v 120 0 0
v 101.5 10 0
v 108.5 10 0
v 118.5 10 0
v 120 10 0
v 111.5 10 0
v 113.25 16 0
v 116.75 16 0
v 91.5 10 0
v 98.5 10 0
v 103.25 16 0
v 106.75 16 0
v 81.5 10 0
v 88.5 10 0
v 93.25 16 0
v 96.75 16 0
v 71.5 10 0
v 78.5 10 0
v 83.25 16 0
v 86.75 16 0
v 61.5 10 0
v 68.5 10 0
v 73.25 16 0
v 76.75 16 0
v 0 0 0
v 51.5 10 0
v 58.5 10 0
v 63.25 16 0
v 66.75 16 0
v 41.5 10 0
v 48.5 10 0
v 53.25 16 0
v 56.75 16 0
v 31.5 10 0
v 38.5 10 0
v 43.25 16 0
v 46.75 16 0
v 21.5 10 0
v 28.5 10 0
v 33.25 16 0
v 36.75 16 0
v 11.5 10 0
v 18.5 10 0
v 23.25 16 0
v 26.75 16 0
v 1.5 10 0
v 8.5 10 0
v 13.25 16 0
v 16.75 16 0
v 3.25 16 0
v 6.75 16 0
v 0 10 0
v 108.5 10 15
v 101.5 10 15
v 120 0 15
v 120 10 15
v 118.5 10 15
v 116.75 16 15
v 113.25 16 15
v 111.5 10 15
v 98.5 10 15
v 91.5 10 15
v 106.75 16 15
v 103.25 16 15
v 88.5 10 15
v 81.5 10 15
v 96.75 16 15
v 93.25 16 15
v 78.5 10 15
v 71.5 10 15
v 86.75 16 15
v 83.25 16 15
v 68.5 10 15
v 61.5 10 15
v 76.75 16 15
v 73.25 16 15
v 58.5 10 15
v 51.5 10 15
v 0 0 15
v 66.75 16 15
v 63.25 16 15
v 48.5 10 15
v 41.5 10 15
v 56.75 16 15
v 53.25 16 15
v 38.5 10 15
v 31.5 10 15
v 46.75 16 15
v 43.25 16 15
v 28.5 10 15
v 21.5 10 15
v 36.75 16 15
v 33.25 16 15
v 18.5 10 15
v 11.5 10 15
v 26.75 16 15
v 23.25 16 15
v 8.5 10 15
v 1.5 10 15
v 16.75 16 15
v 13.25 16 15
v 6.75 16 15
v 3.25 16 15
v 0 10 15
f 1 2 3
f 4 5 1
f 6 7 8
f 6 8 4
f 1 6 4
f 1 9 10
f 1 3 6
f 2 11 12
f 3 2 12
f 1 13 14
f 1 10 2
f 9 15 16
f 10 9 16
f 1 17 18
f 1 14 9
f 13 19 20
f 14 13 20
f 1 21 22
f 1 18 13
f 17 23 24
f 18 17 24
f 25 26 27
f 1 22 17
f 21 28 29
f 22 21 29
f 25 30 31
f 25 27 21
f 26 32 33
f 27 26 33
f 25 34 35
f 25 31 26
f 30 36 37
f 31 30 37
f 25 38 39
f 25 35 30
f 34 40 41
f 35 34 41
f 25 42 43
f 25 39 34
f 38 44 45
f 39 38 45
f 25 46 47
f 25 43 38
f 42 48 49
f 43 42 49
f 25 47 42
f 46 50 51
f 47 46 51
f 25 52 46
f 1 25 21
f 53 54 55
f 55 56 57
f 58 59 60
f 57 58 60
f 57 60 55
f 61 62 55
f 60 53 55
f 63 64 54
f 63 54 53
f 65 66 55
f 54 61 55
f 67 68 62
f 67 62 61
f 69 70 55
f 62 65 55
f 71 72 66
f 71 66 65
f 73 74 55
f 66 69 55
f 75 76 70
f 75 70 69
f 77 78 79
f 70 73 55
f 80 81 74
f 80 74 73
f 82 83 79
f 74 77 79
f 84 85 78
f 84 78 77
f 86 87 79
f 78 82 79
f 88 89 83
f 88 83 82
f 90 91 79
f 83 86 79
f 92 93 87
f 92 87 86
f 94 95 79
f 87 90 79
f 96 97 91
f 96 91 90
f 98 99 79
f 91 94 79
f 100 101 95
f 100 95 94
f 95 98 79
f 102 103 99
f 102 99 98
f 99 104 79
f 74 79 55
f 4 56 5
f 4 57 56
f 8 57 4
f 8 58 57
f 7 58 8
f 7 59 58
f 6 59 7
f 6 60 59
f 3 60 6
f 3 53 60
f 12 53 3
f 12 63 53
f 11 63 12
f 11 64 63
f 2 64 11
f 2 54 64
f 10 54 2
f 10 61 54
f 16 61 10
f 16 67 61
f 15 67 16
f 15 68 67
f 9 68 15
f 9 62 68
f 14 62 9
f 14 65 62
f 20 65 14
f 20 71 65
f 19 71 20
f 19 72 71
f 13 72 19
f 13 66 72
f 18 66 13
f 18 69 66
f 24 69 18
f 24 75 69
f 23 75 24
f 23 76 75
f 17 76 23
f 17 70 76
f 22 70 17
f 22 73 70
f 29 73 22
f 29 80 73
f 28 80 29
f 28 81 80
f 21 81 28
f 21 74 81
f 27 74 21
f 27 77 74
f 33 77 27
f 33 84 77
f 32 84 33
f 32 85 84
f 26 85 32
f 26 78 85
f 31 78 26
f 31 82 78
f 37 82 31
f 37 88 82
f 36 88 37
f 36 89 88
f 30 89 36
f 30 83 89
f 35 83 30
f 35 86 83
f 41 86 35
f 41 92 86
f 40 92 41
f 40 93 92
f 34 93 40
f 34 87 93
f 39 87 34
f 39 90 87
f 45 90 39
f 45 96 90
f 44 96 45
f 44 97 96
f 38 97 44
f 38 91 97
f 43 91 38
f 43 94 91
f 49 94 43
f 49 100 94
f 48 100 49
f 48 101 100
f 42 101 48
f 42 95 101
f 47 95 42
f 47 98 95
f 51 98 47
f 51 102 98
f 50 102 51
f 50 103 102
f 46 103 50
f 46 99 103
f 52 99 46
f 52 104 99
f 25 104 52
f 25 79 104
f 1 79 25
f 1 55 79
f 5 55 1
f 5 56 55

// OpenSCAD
$fn = 32;

// ----------------------------------------------------------------------
// Gear rack: 12 teeth, pitch 10 mm
// ----------------------------------------------------------------------

// --- parameters (mm) ---
teeth = 12;               // number of teeth
pitch = 10;               // tooth pitch, X
root_w = 7;               // tooth width at the root
tip_w = 3.5;              // tooth width at the tip
base_h = 10;              // rack body height, Y
tooth_h = 6;              // tooth height above the body
plate_t = 15;             // rack width, Z (extrusion height)

rack_l = teeth * pitch;  // overall length
total_h = base_h + tooth_h;  // overall height

profile = [[0, 0], [120, 0], [120, 10], [118.5, 10], [116.75, 16], [113.25, 16], [111.5, 10], [108.5, 10], [106.75, 16], [103.25, 16], [101.5, 10], [98.5, 10], [96.75, 16], [93.25, 16], [91.5, 10], [88.5, 10], [86.75, 16], [83.25, 16], [81.5, 10], [78.5, 10], [76.75, 16], [73.25, 16], [71.5, 10], [68.5, 10], [66.75, 16], [63.25, 16], [61.5, 10], [58.5, 10], [56.75, 16], [53.25, 16], [51.5, 10], [48.5, 10], [46.75, 16], [43.25, 16], [41.5, 10], [38.5, 10], [36.75, 16], [33.25, 16], [31.5, 10], [28.5, 10], [26.75, 16], [23.25, 16], [21.5, 10], [18.5, 10], [16.75, 16], [13.25, 16], [11.5, 10], [8.5, 10], [6.75, 16], [3.25, 16], [1.5, 10], [0, 10]];  // primary outline, 52 points, counter clockwise

// --- the one profile operation ---
linear_extrude(height = plate_t) polygon(points = profile);
